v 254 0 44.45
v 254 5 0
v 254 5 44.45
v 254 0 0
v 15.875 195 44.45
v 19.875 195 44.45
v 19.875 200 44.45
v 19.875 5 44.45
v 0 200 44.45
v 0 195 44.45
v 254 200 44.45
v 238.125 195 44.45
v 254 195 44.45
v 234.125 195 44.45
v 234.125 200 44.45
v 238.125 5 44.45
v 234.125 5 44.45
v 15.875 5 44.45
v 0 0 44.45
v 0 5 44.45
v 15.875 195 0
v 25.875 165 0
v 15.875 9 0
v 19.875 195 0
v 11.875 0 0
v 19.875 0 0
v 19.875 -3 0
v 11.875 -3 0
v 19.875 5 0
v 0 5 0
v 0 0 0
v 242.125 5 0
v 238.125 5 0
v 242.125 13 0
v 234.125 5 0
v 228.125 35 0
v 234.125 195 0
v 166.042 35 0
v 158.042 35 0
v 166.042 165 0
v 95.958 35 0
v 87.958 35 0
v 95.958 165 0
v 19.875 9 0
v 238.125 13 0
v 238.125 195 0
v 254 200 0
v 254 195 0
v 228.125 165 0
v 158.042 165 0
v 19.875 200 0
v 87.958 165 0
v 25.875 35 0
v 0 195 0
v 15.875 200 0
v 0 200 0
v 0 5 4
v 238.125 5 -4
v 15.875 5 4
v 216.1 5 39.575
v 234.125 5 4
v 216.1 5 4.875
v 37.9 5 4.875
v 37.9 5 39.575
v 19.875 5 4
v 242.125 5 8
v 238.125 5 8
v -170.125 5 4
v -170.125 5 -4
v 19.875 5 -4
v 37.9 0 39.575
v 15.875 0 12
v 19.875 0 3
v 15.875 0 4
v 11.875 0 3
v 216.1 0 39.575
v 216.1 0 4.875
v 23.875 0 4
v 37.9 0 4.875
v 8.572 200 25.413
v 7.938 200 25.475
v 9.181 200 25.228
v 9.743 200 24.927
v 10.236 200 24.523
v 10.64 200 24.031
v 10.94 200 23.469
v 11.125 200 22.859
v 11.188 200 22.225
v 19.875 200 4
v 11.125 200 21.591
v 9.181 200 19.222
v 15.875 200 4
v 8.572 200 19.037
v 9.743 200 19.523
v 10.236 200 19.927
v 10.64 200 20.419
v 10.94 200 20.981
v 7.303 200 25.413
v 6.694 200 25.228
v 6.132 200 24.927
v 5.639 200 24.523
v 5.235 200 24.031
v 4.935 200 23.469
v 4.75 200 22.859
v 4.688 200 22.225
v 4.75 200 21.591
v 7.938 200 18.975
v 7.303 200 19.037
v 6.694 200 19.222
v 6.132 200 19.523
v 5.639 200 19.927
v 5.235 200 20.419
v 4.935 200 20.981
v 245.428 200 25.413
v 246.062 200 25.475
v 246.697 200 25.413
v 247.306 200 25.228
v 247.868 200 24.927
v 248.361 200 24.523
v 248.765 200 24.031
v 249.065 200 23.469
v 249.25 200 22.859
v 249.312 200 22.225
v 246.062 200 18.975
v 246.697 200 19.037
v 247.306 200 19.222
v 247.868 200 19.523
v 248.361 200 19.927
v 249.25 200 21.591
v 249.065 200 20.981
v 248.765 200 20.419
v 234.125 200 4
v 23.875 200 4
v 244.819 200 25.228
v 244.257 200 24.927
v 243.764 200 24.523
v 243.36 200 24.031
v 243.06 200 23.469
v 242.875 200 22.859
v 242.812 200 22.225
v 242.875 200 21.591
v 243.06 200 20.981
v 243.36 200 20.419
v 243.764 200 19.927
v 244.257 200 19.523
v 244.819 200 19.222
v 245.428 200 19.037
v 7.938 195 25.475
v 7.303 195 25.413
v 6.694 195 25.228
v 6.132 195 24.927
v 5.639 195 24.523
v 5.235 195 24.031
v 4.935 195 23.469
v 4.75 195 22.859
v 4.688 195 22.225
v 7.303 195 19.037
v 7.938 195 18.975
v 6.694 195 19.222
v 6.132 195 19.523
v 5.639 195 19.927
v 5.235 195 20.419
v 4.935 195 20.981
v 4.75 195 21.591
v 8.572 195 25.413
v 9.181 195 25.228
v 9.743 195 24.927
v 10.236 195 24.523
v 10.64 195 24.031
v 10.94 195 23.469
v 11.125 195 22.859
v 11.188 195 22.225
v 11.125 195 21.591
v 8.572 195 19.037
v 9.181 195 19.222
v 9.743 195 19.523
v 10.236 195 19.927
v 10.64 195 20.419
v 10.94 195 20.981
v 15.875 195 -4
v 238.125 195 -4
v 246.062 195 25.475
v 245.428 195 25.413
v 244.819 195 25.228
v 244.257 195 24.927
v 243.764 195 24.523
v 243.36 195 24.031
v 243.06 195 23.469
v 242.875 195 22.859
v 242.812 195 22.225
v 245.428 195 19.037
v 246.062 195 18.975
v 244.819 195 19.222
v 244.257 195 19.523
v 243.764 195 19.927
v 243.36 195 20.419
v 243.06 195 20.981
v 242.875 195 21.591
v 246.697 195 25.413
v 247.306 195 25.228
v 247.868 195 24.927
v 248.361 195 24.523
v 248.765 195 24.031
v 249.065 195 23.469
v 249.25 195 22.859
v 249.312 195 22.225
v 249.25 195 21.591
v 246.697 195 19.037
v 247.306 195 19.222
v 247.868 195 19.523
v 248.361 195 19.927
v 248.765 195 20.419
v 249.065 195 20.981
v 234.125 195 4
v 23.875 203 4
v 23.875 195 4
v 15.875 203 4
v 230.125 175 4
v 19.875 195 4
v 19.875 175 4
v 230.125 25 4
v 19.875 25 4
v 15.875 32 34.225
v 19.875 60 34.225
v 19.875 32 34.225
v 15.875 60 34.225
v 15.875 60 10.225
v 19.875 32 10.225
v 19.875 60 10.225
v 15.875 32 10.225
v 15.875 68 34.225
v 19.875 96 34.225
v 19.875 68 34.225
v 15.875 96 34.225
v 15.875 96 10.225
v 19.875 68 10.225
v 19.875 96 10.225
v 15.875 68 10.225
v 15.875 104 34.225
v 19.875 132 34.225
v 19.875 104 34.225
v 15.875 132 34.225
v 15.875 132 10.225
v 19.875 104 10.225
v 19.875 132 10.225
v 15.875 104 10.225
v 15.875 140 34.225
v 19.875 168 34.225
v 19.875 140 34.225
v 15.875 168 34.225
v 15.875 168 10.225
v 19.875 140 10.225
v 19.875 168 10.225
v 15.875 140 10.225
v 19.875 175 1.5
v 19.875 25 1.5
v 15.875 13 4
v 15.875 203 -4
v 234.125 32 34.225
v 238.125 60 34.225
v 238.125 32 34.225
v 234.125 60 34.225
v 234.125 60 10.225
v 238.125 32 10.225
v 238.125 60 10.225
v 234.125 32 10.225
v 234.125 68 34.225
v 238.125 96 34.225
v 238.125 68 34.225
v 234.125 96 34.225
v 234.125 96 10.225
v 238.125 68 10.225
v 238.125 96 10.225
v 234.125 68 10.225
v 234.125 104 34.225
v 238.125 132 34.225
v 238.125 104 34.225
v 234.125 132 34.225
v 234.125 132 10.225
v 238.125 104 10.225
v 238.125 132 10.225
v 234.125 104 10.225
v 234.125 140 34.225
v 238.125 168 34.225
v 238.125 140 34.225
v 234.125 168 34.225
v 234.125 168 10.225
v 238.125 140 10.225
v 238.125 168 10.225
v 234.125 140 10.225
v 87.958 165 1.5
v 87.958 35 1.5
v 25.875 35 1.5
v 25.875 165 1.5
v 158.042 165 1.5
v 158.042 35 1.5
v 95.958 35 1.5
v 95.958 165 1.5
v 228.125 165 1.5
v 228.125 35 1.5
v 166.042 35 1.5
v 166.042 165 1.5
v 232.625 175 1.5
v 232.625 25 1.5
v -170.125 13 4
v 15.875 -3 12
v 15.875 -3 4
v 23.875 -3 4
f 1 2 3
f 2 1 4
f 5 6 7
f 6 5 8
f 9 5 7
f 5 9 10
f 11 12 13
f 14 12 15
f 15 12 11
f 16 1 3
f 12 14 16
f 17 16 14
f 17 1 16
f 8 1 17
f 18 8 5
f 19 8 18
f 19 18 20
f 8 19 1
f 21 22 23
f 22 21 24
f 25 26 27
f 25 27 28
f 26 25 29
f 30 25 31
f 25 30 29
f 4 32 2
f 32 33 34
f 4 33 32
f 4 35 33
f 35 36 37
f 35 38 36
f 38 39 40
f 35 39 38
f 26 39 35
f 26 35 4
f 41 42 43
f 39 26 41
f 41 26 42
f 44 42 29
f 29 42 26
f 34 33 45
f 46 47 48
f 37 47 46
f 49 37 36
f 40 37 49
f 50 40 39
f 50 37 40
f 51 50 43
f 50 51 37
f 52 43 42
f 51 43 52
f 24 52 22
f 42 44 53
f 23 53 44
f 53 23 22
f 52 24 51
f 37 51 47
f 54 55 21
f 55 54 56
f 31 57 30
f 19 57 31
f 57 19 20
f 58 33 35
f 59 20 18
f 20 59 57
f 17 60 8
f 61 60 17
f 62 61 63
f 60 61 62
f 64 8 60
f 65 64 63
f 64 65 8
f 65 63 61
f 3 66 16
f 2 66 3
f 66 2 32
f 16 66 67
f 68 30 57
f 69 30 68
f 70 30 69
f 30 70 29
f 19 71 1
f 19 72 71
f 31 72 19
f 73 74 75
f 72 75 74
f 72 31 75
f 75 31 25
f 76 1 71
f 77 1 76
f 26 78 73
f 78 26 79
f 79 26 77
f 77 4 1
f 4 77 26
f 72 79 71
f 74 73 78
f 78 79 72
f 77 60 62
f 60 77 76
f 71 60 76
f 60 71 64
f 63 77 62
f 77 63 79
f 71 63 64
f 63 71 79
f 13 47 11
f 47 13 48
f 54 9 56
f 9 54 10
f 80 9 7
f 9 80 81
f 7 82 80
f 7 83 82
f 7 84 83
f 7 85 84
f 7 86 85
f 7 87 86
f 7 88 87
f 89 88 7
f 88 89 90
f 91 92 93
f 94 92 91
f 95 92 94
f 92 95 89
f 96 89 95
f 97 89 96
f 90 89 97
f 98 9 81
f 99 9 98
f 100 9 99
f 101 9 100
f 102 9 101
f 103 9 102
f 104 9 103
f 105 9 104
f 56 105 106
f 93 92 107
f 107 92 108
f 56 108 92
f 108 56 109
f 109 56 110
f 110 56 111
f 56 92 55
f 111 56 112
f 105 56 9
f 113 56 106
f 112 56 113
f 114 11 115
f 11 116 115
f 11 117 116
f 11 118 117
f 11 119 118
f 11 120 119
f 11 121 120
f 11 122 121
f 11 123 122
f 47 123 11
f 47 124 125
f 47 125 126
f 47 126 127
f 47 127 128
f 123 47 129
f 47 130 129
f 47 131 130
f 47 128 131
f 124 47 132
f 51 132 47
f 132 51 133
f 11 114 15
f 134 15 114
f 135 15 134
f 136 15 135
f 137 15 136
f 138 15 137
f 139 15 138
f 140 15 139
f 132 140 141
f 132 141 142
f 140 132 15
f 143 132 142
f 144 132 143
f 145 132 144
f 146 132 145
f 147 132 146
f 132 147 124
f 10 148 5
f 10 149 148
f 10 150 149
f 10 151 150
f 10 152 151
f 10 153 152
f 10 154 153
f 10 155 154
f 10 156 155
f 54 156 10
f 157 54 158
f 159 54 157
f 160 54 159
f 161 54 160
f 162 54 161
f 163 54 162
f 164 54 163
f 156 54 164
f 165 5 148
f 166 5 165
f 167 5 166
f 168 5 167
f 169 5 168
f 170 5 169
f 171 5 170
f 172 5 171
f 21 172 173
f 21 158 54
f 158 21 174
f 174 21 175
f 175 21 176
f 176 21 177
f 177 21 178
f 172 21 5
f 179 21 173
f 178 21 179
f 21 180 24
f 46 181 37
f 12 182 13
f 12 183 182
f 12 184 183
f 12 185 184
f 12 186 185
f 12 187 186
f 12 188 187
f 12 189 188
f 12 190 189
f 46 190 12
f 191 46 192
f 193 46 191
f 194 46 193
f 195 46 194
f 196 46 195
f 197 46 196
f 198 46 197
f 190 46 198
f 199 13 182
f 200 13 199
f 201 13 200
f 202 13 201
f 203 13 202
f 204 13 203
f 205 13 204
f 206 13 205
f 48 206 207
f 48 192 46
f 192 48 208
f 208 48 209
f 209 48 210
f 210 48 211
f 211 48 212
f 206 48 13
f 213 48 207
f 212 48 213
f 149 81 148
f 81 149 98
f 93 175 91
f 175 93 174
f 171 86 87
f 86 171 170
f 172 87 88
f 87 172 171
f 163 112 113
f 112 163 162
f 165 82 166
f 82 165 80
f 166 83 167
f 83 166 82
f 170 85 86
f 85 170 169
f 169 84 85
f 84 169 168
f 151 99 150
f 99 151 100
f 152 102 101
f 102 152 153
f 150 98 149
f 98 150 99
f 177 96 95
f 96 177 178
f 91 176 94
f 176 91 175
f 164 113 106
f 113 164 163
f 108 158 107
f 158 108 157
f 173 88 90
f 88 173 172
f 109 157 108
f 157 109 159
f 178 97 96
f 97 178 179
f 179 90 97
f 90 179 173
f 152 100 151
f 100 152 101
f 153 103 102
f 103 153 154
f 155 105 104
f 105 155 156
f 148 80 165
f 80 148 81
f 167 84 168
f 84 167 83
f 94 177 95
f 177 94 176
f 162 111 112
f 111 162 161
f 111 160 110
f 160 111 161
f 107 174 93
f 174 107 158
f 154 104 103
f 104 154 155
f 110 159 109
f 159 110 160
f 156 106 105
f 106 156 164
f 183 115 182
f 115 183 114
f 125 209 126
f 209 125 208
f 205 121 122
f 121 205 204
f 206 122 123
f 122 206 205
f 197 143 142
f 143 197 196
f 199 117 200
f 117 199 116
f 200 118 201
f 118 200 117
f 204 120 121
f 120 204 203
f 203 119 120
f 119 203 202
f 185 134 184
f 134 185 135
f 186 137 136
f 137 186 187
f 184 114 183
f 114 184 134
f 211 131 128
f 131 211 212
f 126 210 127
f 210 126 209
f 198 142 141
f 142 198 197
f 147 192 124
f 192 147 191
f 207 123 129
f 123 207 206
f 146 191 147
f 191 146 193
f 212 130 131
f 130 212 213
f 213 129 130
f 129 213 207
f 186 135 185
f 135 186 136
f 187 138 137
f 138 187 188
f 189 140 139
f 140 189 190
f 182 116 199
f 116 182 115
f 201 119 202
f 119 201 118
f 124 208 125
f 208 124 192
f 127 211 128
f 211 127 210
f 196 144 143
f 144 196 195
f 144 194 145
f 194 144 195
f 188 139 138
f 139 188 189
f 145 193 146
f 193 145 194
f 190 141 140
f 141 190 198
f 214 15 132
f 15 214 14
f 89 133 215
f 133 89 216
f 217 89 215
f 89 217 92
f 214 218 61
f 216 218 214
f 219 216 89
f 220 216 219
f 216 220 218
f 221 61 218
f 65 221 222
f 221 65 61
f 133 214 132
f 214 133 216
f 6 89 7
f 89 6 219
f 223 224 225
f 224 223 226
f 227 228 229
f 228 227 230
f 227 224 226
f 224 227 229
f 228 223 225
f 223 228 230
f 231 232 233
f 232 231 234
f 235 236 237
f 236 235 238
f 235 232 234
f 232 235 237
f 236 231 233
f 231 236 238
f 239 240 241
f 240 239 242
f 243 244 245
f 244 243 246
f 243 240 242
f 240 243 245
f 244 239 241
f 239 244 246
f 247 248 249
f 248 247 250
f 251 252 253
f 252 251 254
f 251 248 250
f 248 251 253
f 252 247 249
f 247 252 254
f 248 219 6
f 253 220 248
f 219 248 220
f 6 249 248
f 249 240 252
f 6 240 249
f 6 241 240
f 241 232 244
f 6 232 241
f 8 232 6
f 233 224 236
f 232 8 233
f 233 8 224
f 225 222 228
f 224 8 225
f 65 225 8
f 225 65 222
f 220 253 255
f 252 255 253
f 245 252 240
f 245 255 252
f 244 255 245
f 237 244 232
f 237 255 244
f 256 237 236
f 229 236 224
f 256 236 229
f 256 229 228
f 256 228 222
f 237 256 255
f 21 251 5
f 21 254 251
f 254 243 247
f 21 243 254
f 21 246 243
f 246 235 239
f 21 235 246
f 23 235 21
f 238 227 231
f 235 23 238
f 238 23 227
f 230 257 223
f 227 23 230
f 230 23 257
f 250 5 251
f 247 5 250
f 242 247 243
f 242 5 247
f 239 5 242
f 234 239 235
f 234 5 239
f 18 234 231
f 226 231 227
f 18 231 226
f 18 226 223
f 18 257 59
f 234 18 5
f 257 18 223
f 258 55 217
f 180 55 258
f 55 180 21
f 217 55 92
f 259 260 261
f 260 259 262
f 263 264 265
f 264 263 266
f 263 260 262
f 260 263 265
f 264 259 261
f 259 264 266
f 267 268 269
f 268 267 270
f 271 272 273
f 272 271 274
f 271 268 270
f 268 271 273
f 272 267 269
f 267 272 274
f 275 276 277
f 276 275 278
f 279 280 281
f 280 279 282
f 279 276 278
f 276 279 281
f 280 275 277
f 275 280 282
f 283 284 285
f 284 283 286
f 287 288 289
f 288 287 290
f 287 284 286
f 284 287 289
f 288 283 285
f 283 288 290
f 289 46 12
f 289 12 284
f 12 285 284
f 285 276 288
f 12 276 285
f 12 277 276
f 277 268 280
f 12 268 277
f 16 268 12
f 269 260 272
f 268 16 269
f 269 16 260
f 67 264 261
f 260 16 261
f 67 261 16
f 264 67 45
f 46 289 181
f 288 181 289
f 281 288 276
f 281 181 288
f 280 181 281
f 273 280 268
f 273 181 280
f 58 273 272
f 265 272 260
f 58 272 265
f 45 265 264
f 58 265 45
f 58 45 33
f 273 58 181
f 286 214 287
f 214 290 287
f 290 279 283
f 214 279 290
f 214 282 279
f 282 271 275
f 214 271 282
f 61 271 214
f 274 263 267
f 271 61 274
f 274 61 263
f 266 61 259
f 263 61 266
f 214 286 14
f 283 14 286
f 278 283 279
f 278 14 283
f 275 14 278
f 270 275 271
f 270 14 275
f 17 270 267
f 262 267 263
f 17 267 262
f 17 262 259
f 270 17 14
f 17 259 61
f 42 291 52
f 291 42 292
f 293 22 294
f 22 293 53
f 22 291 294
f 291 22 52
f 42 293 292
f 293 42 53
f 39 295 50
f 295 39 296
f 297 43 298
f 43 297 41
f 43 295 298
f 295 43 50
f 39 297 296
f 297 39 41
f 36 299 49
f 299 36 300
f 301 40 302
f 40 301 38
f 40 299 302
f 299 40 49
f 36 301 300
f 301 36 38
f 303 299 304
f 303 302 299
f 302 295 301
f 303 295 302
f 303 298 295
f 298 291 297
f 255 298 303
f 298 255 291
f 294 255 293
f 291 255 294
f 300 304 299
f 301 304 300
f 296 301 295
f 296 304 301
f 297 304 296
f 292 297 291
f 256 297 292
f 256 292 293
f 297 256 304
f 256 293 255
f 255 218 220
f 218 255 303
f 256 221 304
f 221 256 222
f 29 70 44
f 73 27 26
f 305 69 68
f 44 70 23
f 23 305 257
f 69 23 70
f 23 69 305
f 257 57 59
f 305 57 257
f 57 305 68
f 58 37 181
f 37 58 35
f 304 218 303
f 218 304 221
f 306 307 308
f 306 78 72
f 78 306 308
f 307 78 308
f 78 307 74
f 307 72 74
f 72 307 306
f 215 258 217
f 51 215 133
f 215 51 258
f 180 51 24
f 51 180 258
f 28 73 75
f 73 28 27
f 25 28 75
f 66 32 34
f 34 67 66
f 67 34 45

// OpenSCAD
// ============================================================
// Lenovo ThinkCentre M93 Tiny — 10" Rack Mount (1U, 4-post) v2
// Material-optimised: floor slots, wall slots, recessed floor
// centre, open rear between crossbar and side walls
// Single print, no supports required (print faceplate-face-down)
// ============================================================

// --- Rack dimensions ---
rack_width         = 254.0;
rack_usable_width  = 222.25;
rack_1u_height     = 44.45;
post_depth         = 200.0;

// --- M93 Tiny dimensions (on its side) ---
m93_w              = 177.8;
m93_h              = 34.3;
m93_d              = 182.0;

// --- Wall / structure thicknesses ---
wall_t             = 4.0;
face_t             = 5.0;
rear_t             = 5.0;
gusset_r           = 8.0;

// --- Floor thinning ---
// M93 feet are near the edges — recess the centre of the floor
// Leave a 20mm rib at each end and a 2mm thin skin in the middle
floor_edge_rib     = 20.0;   // solid rib width at faceplate + rear ends
floor_thin_t       = 1.5;    // thinned floor thickness in recessed centre
// full floor thickness = wall_t = 4mm, so recess depth = wall_t - floor_thin_t
floor_recess_d     = wall_t - floor_thin_t;  // 2.5mm recess

// --- Floor lightening slots ---
// 3 rectangular slots cut through thinned floor area, separated by ribs
floor_slot_count   = 3;
floor_slot_margin  = 10.0;   // margin from side walls before first/last slot
floor_rib_w        = 8.0;    // rib width between slots

// --- Side wall slots ---
wall_slot_h        = 24.0;   // slot height (leaves top+bottom structural band)
wall_slot_w        = 28.0;   // individual slot width
wall_slot_rib      = 8.0;    // rib between slots
wall_slot_margin   = 12.0;   // margin from faceplate + rear crossbar
wall_slot_z        = (rack_1u_height - wall_slot_h) / 2;  // centred vertically

// --- Mounting holes ---
m6_hole_d          = 6.5;
ear_w              = (rack_width - rack_usable_width) / 2;  // 15.875
hole_x             = ear_w / 2;
hole_y             = rack_1u_height / 2;

// --- Derived ---
inner_w            = rack_usable_width - 2 * wall_t;
tray_run           = post_depth - face_t - rear_t;  // 190mm

// ============================================================
// MODULES
// ============================================================

module rack_ear(side) {
    translate([side == 1 ? rack_width - ear_w : 0, 0, 0])
    difference() {
        cube([ear_w, face_t, rack_1u_height]);
        translate([hole_x, face_t / 2, hole_y])
        rotate([90, 0, 0])
        cylinder(d = m6_hole_d, h = face_t + 1, center = true, $fn = 32);
    }
}

module rear_crossbar() {
    // Only the crossbar strip itself — no fill between side walls
    // Left ear portion
    translate([0, post_depth - rear_t, 0])
    difference() {
        cube([rack_width, rear_t, rack_1u_height]);
        // Left M6 hole
        translate([hole_x, rear_t / 2, hole_y])
        rotate([90, 0, 0])
        cylinder(d = m6_hole_d, h = rear_t + 1, center = true, $fn = 32);
        // Right M6 hole
        translate([rack_width - hole_x, rear_t / 2, hole_y])
        rotate([90, 0, 0])
        cylinder(d = m6_hole_d, h = rear_t + 1, center = true, $fn = 32);
        // Open the middle between the side walls — cut out everything except the ears
        translate([ear_w + wall_t, -0.1, wall_t])
        cube([
            rack_usable_width - 2 * wall_t,
            rear_t + 0.2,
            rack_1u_height - wall_t + 0.1
        ]);
    }
}

module faceplate() {
    cutout_w = m93_w + 0.4;
    cutout_h = m93_h + 0.4;
    cutout_x = (rack_width - cutout_w) / 2;
    cutout_z = (rack_1u_height - cutout_h) / 2;

    difference() {
        cube([rack_width, face_t, rack_1u_height]);
        translate([cutout_x, -0.1, cutout_z])
        cube([cutout_w, face_t + 0.2, cutout_h]);
    }
}

module side_wall_slotted(side) {
    x_pos = (side == 0) ? ear_w : rack_width - ear_w - wall_t;
    // How many slots fit in the wall run minus margins?
    slot_run = tray_run - 2 * wall_slot_margin;
    // Number of slots that fit
    n_slots = floor((slot_run + wall_slot_rib) / (wall_slot_w + wall_slot_rib));
    // Total width of slots + ribs, centred in slot_run
    total_slot_w = n_slots * wall_slot_w + (n_slots - 1) * wall_slot_rib;
    slot_start_y = face_t + wall_slot_margin + (slot_run - total_slot_w) / 2;

    translate([x_pos, face_t, 0])
    difference() {
        cube([wall_t, tray_run, rack_1u_height]);
        for (i = [0 : n_slots - 1]) {
            translate([
                -0.1,
                slot_start_y - face_t + i * (wall_slot_w + wall_slot_rib),
                wall_slot_z
            ])
            cube([wall_t + 0.2, wall_slot_w, wall_slot_h]);
        }
    }
}

module floor_panel_optimised() {
    // Floor with:
    // 1. Recessed centre (thinned skin)
    // 2. Lightening slots through the thinned region
    floor_x    = ear_w;
    floor_y    = face_t;
    floor_w    = rack_usable_width;
    floor_full = tray_run;

    // Recessed zone runs between the two edge ribs
    recess_y_start = floor_edge_rib;
    recess_y_len   = floor_full - 2 * floor_edge_rib;

    // Slot dimensions within recessed zone
    slot_zone_w  = floor_w - 2 * floor_slot_margin;
    total_slot_w_floor = slot_zone_w
                       - (floor_slot_count - 1) * floor_rib_w;
    slot_w_each  = total_slot_w_floor / floor_slot_count;
    slot_x_start = floor_slot_margin;

    translate([floor_x, floor_y, 0])
    difference() {
        // Full floor solid
        cube([floor_w, floor_full, wall_t]);

        // Centre recess (leaves thin skin at bottom)
        translate([-0.1, recess_y_start, floor_thin_t])
        cube([floor_w + 0.2, recess_y_len, floor_recess_d + 0.1]);

        // Lightening slots — cut fully through the thinned area
        for (i = [0 : floor_slot_count - 1]) {
            slot_x = slot_x_start + i * (slot_w_each + floor_rib_w);
            translate([slot_x, recess_y_start + 10, -0.1])
            cube([slot_w_each, recess_y_len - 20, wall_t + 0.2]);
        }
    }
}

module gussets() {
    // Floor-to-left-wall
    translate([ear_w + wall_t, face_t, wall_t])
    rotate([0, -90, 0])
    rotate([0, 0, 90])
    linear_extrude(height = tray_run)
    polygon(points = [[0,0],[gusset_r,0],[0,gusset_r]]);

    // Floor-to-right-wall
    translate([rack_width - ear_w, face_t, wall_t])
    rotate([0, 0, 90])
    rotate([0, 90, 0])
    linear_extrude(height = tray_run)
    polygon(points = [[0,0],[gusset_r,0],[0,gusset_r]]);

    // Faceplate-to-floor
    translate([ear_w, face_t, wall_t])
    rotate([90, 0, 0])
    linear_extrude(height = gusset_r)
    polygon(points = [[0,0],[gusset_r,0],[0,gusset_r]]);

    // Rear-to-floor
    translate([ear_w, post_depth - rear_t, wall_t])
    rotate([-90, 0, 0])
    linear_extrude(height = gusset_r)
    polygon(points = [[0,0],[gusset_r,0],[0,gusset_r]]);

    // Faceplate-to-left-wall
    translate([ear_w + wall_t, face_t, 0])
    rotate([90, 0, -90])
    linear_extrude(height = gusset_r)
    polygon(points = [[0,0],[gusset_r,0],[0,gusset_r]]);

    // Faceplate-to-right-wall
    translate([rack_width - ear_w - wall_t, face_t, 0])
    rotate([90, 0, 90])
    linear_extrude(height = gusset_r)
    polygon(points = [[0,0],[gusset_r,0],[0,gusset_r]]);
}

// ============================================================
// ASSEMBLY
// ============================================================

union() {
    faceplate();
    rack_ear(0);
    rack_ear(1);
    rear_crossbar();
    side_wall_slotted(0);
    side_wall_slotted(1);
    floor_panel_optimised();
    gussets();
}

// ============================================================
// PREVIEW GHOST: M93 unit position
// ============================================================
/*
%translate([
    ear_w + wall_t + (inner_w - m93_w) / 2,
    face_t,
    wall_t
])
cube([m93_w, m93_d, m93_h]);
*/
